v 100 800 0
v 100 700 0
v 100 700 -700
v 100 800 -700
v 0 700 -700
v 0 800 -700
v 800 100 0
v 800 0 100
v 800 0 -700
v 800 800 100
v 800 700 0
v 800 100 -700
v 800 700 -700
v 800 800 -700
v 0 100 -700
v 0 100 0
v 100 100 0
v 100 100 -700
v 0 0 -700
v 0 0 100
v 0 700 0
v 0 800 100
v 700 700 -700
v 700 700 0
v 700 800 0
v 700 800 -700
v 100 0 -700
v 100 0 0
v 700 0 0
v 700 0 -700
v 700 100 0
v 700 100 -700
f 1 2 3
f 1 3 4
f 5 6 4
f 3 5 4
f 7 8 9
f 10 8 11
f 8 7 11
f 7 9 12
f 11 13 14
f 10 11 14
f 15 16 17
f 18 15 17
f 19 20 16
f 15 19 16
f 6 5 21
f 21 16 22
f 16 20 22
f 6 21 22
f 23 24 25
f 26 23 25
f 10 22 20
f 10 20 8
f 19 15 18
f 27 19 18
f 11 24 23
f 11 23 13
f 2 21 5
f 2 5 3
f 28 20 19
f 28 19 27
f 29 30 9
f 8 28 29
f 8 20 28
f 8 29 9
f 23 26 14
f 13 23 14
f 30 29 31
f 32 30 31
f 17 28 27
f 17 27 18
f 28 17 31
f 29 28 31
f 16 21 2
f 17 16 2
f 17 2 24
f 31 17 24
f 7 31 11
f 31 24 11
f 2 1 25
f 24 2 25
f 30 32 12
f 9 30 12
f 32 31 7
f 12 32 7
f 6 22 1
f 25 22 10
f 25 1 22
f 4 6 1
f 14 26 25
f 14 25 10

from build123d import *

# Parameters (mm, degrees)
F1_W     = 800
F1_H     = 800
F2_DEPTH = 100
F0_W     = 100
F0_H     = 100
F3_DEPTH = 700


with BuildPart() as f2:
    # F1 (on Top) → F2 (new body)
    with BuildSketch(Plane.XY):
        with Locations((400, 400)):
            Rectangle(F1_W, F1_H)
    extrude(amount=F2_DEPTH)

    # F0 (on Top) → F3 (join)
    with BuildSketch(Plane.XY):
        with Locations((50, 50)):
            Rectangle(F0_W, F0_H)
        with Locations((750, 50)):
            Rectangle(F0_W, F0_H)
        with Locations((50, 750)):
            Rectangle(F0_W, F0_H)
        with Locations((750, 750)):
            Rectangle(F0_W, F0_H)
    extrude(amount=-F3_DEPTH)


solid = f2.part
